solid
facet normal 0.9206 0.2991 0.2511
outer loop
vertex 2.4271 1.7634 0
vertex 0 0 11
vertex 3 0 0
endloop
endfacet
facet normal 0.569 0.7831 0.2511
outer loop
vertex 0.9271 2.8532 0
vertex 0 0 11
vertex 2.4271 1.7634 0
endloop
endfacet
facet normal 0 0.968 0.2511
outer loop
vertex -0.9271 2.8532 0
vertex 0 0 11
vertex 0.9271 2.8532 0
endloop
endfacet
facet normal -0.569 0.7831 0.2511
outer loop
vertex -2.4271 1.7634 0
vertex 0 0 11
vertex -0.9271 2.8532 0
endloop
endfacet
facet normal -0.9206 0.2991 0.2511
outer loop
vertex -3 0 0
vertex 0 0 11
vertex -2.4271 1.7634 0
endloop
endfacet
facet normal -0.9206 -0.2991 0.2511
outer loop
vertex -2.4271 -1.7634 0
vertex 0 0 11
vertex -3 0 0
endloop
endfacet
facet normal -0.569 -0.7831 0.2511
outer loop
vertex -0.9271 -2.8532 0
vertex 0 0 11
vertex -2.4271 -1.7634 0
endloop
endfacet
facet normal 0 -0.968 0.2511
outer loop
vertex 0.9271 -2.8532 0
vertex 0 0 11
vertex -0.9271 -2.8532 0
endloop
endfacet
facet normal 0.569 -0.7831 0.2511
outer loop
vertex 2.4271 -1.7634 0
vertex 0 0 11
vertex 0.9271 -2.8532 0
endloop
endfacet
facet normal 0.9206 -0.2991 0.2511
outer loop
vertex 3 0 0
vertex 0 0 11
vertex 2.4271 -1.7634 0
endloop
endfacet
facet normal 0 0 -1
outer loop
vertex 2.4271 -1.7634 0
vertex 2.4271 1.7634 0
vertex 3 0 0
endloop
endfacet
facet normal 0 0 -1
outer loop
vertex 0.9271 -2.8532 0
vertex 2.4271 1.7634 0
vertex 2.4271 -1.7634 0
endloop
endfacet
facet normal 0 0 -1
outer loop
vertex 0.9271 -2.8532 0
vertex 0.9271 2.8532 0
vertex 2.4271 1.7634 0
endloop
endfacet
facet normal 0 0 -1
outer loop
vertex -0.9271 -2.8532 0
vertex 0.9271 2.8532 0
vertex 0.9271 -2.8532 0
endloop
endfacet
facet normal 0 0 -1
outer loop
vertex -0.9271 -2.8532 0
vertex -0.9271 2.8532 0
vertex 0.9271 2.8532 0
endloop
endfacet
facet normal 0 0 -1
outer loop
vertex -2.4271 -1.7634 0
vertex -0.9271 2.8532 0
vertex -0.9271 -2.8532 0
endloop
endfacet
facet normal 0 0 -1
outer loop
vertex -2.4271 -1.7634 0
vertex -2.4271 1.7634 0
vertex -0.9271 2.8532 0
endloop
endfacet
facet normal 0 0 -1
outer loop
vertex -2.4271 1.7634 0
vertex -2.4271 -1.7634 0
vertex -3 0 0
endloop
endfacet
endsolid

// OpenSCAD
// Generated by SolidPython 1.0.1 on 2020-07-29 00:46:43


cylinder(h = 11, r1 = 3, r2 = 0);
/***********************************************
*********      SolidPython code:      **********
************************************************
 
# import packages: SolidPython
from solid import *
from solid.utils import *
from itertools import chain, combinations, permutations


class Resize:

    def __init__(self, scad_file):
        self.scad_file = scad_file
        #self.scad_file = import_scad(scad_file)
        # cone/cylinder param:
        self.r1 = 0
        self.r2 = 0
        self.h = 0
        # rectangular prism param:
        self.w = 0
        self.l = 0
        # ellipse param:
        self.r = 0

    # import OpenScad code (file name corresponds to shape)


    # classify shape + parameters
    def assign(self, param1, param2, param3):
        if self.scad_file == 'cone.scad':
            self.r1 = param1
            self.r2 = param2
            self.h = param3
        elif self.scad_file == 'cylinder.scad':
            self.r1 = param1
            self.r2 = param2
            self.h = param3
        elif self.scad_file == 'rectangularPrism.scad':
            self.h = param1
            self.l = param2
            self.w = param3
        else:
            self.r = param1
            self.h = param2

    # resize parameters
    def iterate(self):
        x = range(3, 20, 2)
        i = 1
        if self.scad_file == 'cone.scad':
            tempList = list(permutations(x, 2))
            for temp in tempList:
                param1 = temp[0]
                param2 = temp[1]
                filepath = 'produced_scad_files/' + 'cone' + str(param1) + '_' + str(param2) + '_' + '.scad'
                scad_render_to_file(cylinder(h=param1, r1=param2, r2=0), filepath)

        elif self.scad_file == 'cylinder.scad':
            tempList = list(permutations(x, 3))
            for temp in tempList:
                param1 = temp[0]
                param2 = temp[1]
                filepath = 'produced_scad_files/' + 'cylinder' + str(param1) + '_' + str(param2) + '_' + '.scad'
                scad_render_to_file(cylinder(h=param1, r1=param2, r2=param2), filepath)

        elif self.scad_file == 'rectangularPrism.scad':
            tempList = list(permutations(x, 3))
            for temp in tempList:
                param1 = temp[0]
                param2 = temp[1]
                param3 = temp[2]
                filepath = 'produced_scad_files/' + 'rectangularPrism' + str(param1) + '_' + str(param2) + '_' + str(
                    param3) + '.scad'
                scad_render_to_file(cube(size=(param1, param2, param3)), filepath)

        elif self.scad_file == 'ellipse.scad':
            tempList = list(permutations(x, 4))
            for temp in tempList:
                param1 = temp[0]
                param2 = temp[1]
                param3 = temp[2]
                param4 = temp[3]
                filepath = 'produced_scad_files/' + 'ellipse' + str(param1) + '_' + str(param2) + '_' + str(param3) + '_' + str(param4) + '.scad'
                scad_render_to_file(scale([param1, param2, param3])(sphere(r=param4)), filepath)

    def render_to_scadfile(self):
        scad_render_to_file(scad, 'example.scad') 
 
************************************************/
